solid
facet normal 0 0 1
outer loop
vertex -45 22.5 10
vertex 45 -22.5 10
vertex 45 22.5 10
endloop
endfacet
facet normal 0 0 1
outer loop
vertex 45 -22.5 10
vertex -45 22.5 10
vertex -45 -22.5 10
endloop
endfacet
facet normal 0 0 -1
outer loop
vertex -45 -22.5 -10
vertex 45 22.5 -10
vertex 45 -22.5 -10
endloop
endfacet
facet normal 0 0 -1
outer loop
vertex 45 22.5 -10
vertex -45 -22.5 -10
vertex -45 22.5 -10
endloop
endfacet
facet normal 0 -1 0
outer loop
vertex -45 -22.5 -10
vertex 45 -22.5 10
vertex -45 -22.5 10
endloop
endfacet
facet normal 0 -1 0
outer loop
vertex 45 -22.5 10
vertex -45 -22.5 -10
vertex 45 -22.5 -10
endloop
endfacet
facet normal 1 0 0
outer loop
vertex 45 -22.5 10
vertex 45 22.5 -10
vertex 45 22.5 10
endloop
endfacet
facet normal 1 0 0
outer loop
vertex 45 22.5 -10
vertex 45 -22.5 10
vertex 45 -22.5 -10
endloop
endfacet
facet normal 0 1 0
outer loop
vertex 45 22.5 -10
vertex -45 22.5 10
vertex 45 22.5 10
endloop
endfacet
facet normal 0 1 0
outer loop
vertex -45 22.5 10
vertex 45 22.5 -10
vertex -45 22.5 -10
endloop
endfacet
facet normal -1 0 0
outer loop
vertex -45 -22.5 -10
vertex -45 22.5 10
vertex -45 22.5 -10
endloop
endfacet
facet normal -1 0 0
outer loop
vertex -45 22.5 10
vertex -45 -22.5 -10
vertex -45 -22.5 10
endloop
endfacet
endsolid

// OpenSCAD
$fn = 64;

// Dimensions
slide_length = 75;     // mm
slide_width = 25;      // mm
slide_thickness = 1;    // mm

base_length = 90;      // mm (X)
base_width = 45;     // mm (Y)
base_height = 20;       // mm (Z)

slot_length = 77;     // mm (along X)
slot_width = 1.6;       // mm (Y direction)
slot_depth = 10;         // mm (into Z)

num_slots = 10;
center_to_center_spacing = 3.5; // mm (Y direction)

// Calculate slot positions: centre the array in X and Y
// Slot centres are spaced by center_to_center_spacing in Y
// The total Y span of the slots: (num_slots - 1) * spacing
total_y_span = (num_slots - 1) * center_to_center_spacing;
y_offset = (base_width - total_y_span) / 2; // offset to centre

// X is centred: slot_length is 77mm, base is 90mm, so 13mm overhang on each side
x_offset = (base_length - slot_length) / 2;

// Create base block
cube([base_length, base_width, base_height], center = true);

// Create and position slots using difference
for (i = [0 : num_slots - 1]) {
    y_pos = y_offset + i * center_to_center_spacing;
    translate([0, y_pos, 0]) {
        difference() {
            // Full rectangular prism to remove from base
            cube([slot_length, slot_width, base_height + 1], center = false);
            // Subtract a slightly larger box to ensure no coplanar faces
            translate([0, 0, -0.01]) cube([slot_length, slot_width, base_height + 1.01], center = false);
        }
    }
}
